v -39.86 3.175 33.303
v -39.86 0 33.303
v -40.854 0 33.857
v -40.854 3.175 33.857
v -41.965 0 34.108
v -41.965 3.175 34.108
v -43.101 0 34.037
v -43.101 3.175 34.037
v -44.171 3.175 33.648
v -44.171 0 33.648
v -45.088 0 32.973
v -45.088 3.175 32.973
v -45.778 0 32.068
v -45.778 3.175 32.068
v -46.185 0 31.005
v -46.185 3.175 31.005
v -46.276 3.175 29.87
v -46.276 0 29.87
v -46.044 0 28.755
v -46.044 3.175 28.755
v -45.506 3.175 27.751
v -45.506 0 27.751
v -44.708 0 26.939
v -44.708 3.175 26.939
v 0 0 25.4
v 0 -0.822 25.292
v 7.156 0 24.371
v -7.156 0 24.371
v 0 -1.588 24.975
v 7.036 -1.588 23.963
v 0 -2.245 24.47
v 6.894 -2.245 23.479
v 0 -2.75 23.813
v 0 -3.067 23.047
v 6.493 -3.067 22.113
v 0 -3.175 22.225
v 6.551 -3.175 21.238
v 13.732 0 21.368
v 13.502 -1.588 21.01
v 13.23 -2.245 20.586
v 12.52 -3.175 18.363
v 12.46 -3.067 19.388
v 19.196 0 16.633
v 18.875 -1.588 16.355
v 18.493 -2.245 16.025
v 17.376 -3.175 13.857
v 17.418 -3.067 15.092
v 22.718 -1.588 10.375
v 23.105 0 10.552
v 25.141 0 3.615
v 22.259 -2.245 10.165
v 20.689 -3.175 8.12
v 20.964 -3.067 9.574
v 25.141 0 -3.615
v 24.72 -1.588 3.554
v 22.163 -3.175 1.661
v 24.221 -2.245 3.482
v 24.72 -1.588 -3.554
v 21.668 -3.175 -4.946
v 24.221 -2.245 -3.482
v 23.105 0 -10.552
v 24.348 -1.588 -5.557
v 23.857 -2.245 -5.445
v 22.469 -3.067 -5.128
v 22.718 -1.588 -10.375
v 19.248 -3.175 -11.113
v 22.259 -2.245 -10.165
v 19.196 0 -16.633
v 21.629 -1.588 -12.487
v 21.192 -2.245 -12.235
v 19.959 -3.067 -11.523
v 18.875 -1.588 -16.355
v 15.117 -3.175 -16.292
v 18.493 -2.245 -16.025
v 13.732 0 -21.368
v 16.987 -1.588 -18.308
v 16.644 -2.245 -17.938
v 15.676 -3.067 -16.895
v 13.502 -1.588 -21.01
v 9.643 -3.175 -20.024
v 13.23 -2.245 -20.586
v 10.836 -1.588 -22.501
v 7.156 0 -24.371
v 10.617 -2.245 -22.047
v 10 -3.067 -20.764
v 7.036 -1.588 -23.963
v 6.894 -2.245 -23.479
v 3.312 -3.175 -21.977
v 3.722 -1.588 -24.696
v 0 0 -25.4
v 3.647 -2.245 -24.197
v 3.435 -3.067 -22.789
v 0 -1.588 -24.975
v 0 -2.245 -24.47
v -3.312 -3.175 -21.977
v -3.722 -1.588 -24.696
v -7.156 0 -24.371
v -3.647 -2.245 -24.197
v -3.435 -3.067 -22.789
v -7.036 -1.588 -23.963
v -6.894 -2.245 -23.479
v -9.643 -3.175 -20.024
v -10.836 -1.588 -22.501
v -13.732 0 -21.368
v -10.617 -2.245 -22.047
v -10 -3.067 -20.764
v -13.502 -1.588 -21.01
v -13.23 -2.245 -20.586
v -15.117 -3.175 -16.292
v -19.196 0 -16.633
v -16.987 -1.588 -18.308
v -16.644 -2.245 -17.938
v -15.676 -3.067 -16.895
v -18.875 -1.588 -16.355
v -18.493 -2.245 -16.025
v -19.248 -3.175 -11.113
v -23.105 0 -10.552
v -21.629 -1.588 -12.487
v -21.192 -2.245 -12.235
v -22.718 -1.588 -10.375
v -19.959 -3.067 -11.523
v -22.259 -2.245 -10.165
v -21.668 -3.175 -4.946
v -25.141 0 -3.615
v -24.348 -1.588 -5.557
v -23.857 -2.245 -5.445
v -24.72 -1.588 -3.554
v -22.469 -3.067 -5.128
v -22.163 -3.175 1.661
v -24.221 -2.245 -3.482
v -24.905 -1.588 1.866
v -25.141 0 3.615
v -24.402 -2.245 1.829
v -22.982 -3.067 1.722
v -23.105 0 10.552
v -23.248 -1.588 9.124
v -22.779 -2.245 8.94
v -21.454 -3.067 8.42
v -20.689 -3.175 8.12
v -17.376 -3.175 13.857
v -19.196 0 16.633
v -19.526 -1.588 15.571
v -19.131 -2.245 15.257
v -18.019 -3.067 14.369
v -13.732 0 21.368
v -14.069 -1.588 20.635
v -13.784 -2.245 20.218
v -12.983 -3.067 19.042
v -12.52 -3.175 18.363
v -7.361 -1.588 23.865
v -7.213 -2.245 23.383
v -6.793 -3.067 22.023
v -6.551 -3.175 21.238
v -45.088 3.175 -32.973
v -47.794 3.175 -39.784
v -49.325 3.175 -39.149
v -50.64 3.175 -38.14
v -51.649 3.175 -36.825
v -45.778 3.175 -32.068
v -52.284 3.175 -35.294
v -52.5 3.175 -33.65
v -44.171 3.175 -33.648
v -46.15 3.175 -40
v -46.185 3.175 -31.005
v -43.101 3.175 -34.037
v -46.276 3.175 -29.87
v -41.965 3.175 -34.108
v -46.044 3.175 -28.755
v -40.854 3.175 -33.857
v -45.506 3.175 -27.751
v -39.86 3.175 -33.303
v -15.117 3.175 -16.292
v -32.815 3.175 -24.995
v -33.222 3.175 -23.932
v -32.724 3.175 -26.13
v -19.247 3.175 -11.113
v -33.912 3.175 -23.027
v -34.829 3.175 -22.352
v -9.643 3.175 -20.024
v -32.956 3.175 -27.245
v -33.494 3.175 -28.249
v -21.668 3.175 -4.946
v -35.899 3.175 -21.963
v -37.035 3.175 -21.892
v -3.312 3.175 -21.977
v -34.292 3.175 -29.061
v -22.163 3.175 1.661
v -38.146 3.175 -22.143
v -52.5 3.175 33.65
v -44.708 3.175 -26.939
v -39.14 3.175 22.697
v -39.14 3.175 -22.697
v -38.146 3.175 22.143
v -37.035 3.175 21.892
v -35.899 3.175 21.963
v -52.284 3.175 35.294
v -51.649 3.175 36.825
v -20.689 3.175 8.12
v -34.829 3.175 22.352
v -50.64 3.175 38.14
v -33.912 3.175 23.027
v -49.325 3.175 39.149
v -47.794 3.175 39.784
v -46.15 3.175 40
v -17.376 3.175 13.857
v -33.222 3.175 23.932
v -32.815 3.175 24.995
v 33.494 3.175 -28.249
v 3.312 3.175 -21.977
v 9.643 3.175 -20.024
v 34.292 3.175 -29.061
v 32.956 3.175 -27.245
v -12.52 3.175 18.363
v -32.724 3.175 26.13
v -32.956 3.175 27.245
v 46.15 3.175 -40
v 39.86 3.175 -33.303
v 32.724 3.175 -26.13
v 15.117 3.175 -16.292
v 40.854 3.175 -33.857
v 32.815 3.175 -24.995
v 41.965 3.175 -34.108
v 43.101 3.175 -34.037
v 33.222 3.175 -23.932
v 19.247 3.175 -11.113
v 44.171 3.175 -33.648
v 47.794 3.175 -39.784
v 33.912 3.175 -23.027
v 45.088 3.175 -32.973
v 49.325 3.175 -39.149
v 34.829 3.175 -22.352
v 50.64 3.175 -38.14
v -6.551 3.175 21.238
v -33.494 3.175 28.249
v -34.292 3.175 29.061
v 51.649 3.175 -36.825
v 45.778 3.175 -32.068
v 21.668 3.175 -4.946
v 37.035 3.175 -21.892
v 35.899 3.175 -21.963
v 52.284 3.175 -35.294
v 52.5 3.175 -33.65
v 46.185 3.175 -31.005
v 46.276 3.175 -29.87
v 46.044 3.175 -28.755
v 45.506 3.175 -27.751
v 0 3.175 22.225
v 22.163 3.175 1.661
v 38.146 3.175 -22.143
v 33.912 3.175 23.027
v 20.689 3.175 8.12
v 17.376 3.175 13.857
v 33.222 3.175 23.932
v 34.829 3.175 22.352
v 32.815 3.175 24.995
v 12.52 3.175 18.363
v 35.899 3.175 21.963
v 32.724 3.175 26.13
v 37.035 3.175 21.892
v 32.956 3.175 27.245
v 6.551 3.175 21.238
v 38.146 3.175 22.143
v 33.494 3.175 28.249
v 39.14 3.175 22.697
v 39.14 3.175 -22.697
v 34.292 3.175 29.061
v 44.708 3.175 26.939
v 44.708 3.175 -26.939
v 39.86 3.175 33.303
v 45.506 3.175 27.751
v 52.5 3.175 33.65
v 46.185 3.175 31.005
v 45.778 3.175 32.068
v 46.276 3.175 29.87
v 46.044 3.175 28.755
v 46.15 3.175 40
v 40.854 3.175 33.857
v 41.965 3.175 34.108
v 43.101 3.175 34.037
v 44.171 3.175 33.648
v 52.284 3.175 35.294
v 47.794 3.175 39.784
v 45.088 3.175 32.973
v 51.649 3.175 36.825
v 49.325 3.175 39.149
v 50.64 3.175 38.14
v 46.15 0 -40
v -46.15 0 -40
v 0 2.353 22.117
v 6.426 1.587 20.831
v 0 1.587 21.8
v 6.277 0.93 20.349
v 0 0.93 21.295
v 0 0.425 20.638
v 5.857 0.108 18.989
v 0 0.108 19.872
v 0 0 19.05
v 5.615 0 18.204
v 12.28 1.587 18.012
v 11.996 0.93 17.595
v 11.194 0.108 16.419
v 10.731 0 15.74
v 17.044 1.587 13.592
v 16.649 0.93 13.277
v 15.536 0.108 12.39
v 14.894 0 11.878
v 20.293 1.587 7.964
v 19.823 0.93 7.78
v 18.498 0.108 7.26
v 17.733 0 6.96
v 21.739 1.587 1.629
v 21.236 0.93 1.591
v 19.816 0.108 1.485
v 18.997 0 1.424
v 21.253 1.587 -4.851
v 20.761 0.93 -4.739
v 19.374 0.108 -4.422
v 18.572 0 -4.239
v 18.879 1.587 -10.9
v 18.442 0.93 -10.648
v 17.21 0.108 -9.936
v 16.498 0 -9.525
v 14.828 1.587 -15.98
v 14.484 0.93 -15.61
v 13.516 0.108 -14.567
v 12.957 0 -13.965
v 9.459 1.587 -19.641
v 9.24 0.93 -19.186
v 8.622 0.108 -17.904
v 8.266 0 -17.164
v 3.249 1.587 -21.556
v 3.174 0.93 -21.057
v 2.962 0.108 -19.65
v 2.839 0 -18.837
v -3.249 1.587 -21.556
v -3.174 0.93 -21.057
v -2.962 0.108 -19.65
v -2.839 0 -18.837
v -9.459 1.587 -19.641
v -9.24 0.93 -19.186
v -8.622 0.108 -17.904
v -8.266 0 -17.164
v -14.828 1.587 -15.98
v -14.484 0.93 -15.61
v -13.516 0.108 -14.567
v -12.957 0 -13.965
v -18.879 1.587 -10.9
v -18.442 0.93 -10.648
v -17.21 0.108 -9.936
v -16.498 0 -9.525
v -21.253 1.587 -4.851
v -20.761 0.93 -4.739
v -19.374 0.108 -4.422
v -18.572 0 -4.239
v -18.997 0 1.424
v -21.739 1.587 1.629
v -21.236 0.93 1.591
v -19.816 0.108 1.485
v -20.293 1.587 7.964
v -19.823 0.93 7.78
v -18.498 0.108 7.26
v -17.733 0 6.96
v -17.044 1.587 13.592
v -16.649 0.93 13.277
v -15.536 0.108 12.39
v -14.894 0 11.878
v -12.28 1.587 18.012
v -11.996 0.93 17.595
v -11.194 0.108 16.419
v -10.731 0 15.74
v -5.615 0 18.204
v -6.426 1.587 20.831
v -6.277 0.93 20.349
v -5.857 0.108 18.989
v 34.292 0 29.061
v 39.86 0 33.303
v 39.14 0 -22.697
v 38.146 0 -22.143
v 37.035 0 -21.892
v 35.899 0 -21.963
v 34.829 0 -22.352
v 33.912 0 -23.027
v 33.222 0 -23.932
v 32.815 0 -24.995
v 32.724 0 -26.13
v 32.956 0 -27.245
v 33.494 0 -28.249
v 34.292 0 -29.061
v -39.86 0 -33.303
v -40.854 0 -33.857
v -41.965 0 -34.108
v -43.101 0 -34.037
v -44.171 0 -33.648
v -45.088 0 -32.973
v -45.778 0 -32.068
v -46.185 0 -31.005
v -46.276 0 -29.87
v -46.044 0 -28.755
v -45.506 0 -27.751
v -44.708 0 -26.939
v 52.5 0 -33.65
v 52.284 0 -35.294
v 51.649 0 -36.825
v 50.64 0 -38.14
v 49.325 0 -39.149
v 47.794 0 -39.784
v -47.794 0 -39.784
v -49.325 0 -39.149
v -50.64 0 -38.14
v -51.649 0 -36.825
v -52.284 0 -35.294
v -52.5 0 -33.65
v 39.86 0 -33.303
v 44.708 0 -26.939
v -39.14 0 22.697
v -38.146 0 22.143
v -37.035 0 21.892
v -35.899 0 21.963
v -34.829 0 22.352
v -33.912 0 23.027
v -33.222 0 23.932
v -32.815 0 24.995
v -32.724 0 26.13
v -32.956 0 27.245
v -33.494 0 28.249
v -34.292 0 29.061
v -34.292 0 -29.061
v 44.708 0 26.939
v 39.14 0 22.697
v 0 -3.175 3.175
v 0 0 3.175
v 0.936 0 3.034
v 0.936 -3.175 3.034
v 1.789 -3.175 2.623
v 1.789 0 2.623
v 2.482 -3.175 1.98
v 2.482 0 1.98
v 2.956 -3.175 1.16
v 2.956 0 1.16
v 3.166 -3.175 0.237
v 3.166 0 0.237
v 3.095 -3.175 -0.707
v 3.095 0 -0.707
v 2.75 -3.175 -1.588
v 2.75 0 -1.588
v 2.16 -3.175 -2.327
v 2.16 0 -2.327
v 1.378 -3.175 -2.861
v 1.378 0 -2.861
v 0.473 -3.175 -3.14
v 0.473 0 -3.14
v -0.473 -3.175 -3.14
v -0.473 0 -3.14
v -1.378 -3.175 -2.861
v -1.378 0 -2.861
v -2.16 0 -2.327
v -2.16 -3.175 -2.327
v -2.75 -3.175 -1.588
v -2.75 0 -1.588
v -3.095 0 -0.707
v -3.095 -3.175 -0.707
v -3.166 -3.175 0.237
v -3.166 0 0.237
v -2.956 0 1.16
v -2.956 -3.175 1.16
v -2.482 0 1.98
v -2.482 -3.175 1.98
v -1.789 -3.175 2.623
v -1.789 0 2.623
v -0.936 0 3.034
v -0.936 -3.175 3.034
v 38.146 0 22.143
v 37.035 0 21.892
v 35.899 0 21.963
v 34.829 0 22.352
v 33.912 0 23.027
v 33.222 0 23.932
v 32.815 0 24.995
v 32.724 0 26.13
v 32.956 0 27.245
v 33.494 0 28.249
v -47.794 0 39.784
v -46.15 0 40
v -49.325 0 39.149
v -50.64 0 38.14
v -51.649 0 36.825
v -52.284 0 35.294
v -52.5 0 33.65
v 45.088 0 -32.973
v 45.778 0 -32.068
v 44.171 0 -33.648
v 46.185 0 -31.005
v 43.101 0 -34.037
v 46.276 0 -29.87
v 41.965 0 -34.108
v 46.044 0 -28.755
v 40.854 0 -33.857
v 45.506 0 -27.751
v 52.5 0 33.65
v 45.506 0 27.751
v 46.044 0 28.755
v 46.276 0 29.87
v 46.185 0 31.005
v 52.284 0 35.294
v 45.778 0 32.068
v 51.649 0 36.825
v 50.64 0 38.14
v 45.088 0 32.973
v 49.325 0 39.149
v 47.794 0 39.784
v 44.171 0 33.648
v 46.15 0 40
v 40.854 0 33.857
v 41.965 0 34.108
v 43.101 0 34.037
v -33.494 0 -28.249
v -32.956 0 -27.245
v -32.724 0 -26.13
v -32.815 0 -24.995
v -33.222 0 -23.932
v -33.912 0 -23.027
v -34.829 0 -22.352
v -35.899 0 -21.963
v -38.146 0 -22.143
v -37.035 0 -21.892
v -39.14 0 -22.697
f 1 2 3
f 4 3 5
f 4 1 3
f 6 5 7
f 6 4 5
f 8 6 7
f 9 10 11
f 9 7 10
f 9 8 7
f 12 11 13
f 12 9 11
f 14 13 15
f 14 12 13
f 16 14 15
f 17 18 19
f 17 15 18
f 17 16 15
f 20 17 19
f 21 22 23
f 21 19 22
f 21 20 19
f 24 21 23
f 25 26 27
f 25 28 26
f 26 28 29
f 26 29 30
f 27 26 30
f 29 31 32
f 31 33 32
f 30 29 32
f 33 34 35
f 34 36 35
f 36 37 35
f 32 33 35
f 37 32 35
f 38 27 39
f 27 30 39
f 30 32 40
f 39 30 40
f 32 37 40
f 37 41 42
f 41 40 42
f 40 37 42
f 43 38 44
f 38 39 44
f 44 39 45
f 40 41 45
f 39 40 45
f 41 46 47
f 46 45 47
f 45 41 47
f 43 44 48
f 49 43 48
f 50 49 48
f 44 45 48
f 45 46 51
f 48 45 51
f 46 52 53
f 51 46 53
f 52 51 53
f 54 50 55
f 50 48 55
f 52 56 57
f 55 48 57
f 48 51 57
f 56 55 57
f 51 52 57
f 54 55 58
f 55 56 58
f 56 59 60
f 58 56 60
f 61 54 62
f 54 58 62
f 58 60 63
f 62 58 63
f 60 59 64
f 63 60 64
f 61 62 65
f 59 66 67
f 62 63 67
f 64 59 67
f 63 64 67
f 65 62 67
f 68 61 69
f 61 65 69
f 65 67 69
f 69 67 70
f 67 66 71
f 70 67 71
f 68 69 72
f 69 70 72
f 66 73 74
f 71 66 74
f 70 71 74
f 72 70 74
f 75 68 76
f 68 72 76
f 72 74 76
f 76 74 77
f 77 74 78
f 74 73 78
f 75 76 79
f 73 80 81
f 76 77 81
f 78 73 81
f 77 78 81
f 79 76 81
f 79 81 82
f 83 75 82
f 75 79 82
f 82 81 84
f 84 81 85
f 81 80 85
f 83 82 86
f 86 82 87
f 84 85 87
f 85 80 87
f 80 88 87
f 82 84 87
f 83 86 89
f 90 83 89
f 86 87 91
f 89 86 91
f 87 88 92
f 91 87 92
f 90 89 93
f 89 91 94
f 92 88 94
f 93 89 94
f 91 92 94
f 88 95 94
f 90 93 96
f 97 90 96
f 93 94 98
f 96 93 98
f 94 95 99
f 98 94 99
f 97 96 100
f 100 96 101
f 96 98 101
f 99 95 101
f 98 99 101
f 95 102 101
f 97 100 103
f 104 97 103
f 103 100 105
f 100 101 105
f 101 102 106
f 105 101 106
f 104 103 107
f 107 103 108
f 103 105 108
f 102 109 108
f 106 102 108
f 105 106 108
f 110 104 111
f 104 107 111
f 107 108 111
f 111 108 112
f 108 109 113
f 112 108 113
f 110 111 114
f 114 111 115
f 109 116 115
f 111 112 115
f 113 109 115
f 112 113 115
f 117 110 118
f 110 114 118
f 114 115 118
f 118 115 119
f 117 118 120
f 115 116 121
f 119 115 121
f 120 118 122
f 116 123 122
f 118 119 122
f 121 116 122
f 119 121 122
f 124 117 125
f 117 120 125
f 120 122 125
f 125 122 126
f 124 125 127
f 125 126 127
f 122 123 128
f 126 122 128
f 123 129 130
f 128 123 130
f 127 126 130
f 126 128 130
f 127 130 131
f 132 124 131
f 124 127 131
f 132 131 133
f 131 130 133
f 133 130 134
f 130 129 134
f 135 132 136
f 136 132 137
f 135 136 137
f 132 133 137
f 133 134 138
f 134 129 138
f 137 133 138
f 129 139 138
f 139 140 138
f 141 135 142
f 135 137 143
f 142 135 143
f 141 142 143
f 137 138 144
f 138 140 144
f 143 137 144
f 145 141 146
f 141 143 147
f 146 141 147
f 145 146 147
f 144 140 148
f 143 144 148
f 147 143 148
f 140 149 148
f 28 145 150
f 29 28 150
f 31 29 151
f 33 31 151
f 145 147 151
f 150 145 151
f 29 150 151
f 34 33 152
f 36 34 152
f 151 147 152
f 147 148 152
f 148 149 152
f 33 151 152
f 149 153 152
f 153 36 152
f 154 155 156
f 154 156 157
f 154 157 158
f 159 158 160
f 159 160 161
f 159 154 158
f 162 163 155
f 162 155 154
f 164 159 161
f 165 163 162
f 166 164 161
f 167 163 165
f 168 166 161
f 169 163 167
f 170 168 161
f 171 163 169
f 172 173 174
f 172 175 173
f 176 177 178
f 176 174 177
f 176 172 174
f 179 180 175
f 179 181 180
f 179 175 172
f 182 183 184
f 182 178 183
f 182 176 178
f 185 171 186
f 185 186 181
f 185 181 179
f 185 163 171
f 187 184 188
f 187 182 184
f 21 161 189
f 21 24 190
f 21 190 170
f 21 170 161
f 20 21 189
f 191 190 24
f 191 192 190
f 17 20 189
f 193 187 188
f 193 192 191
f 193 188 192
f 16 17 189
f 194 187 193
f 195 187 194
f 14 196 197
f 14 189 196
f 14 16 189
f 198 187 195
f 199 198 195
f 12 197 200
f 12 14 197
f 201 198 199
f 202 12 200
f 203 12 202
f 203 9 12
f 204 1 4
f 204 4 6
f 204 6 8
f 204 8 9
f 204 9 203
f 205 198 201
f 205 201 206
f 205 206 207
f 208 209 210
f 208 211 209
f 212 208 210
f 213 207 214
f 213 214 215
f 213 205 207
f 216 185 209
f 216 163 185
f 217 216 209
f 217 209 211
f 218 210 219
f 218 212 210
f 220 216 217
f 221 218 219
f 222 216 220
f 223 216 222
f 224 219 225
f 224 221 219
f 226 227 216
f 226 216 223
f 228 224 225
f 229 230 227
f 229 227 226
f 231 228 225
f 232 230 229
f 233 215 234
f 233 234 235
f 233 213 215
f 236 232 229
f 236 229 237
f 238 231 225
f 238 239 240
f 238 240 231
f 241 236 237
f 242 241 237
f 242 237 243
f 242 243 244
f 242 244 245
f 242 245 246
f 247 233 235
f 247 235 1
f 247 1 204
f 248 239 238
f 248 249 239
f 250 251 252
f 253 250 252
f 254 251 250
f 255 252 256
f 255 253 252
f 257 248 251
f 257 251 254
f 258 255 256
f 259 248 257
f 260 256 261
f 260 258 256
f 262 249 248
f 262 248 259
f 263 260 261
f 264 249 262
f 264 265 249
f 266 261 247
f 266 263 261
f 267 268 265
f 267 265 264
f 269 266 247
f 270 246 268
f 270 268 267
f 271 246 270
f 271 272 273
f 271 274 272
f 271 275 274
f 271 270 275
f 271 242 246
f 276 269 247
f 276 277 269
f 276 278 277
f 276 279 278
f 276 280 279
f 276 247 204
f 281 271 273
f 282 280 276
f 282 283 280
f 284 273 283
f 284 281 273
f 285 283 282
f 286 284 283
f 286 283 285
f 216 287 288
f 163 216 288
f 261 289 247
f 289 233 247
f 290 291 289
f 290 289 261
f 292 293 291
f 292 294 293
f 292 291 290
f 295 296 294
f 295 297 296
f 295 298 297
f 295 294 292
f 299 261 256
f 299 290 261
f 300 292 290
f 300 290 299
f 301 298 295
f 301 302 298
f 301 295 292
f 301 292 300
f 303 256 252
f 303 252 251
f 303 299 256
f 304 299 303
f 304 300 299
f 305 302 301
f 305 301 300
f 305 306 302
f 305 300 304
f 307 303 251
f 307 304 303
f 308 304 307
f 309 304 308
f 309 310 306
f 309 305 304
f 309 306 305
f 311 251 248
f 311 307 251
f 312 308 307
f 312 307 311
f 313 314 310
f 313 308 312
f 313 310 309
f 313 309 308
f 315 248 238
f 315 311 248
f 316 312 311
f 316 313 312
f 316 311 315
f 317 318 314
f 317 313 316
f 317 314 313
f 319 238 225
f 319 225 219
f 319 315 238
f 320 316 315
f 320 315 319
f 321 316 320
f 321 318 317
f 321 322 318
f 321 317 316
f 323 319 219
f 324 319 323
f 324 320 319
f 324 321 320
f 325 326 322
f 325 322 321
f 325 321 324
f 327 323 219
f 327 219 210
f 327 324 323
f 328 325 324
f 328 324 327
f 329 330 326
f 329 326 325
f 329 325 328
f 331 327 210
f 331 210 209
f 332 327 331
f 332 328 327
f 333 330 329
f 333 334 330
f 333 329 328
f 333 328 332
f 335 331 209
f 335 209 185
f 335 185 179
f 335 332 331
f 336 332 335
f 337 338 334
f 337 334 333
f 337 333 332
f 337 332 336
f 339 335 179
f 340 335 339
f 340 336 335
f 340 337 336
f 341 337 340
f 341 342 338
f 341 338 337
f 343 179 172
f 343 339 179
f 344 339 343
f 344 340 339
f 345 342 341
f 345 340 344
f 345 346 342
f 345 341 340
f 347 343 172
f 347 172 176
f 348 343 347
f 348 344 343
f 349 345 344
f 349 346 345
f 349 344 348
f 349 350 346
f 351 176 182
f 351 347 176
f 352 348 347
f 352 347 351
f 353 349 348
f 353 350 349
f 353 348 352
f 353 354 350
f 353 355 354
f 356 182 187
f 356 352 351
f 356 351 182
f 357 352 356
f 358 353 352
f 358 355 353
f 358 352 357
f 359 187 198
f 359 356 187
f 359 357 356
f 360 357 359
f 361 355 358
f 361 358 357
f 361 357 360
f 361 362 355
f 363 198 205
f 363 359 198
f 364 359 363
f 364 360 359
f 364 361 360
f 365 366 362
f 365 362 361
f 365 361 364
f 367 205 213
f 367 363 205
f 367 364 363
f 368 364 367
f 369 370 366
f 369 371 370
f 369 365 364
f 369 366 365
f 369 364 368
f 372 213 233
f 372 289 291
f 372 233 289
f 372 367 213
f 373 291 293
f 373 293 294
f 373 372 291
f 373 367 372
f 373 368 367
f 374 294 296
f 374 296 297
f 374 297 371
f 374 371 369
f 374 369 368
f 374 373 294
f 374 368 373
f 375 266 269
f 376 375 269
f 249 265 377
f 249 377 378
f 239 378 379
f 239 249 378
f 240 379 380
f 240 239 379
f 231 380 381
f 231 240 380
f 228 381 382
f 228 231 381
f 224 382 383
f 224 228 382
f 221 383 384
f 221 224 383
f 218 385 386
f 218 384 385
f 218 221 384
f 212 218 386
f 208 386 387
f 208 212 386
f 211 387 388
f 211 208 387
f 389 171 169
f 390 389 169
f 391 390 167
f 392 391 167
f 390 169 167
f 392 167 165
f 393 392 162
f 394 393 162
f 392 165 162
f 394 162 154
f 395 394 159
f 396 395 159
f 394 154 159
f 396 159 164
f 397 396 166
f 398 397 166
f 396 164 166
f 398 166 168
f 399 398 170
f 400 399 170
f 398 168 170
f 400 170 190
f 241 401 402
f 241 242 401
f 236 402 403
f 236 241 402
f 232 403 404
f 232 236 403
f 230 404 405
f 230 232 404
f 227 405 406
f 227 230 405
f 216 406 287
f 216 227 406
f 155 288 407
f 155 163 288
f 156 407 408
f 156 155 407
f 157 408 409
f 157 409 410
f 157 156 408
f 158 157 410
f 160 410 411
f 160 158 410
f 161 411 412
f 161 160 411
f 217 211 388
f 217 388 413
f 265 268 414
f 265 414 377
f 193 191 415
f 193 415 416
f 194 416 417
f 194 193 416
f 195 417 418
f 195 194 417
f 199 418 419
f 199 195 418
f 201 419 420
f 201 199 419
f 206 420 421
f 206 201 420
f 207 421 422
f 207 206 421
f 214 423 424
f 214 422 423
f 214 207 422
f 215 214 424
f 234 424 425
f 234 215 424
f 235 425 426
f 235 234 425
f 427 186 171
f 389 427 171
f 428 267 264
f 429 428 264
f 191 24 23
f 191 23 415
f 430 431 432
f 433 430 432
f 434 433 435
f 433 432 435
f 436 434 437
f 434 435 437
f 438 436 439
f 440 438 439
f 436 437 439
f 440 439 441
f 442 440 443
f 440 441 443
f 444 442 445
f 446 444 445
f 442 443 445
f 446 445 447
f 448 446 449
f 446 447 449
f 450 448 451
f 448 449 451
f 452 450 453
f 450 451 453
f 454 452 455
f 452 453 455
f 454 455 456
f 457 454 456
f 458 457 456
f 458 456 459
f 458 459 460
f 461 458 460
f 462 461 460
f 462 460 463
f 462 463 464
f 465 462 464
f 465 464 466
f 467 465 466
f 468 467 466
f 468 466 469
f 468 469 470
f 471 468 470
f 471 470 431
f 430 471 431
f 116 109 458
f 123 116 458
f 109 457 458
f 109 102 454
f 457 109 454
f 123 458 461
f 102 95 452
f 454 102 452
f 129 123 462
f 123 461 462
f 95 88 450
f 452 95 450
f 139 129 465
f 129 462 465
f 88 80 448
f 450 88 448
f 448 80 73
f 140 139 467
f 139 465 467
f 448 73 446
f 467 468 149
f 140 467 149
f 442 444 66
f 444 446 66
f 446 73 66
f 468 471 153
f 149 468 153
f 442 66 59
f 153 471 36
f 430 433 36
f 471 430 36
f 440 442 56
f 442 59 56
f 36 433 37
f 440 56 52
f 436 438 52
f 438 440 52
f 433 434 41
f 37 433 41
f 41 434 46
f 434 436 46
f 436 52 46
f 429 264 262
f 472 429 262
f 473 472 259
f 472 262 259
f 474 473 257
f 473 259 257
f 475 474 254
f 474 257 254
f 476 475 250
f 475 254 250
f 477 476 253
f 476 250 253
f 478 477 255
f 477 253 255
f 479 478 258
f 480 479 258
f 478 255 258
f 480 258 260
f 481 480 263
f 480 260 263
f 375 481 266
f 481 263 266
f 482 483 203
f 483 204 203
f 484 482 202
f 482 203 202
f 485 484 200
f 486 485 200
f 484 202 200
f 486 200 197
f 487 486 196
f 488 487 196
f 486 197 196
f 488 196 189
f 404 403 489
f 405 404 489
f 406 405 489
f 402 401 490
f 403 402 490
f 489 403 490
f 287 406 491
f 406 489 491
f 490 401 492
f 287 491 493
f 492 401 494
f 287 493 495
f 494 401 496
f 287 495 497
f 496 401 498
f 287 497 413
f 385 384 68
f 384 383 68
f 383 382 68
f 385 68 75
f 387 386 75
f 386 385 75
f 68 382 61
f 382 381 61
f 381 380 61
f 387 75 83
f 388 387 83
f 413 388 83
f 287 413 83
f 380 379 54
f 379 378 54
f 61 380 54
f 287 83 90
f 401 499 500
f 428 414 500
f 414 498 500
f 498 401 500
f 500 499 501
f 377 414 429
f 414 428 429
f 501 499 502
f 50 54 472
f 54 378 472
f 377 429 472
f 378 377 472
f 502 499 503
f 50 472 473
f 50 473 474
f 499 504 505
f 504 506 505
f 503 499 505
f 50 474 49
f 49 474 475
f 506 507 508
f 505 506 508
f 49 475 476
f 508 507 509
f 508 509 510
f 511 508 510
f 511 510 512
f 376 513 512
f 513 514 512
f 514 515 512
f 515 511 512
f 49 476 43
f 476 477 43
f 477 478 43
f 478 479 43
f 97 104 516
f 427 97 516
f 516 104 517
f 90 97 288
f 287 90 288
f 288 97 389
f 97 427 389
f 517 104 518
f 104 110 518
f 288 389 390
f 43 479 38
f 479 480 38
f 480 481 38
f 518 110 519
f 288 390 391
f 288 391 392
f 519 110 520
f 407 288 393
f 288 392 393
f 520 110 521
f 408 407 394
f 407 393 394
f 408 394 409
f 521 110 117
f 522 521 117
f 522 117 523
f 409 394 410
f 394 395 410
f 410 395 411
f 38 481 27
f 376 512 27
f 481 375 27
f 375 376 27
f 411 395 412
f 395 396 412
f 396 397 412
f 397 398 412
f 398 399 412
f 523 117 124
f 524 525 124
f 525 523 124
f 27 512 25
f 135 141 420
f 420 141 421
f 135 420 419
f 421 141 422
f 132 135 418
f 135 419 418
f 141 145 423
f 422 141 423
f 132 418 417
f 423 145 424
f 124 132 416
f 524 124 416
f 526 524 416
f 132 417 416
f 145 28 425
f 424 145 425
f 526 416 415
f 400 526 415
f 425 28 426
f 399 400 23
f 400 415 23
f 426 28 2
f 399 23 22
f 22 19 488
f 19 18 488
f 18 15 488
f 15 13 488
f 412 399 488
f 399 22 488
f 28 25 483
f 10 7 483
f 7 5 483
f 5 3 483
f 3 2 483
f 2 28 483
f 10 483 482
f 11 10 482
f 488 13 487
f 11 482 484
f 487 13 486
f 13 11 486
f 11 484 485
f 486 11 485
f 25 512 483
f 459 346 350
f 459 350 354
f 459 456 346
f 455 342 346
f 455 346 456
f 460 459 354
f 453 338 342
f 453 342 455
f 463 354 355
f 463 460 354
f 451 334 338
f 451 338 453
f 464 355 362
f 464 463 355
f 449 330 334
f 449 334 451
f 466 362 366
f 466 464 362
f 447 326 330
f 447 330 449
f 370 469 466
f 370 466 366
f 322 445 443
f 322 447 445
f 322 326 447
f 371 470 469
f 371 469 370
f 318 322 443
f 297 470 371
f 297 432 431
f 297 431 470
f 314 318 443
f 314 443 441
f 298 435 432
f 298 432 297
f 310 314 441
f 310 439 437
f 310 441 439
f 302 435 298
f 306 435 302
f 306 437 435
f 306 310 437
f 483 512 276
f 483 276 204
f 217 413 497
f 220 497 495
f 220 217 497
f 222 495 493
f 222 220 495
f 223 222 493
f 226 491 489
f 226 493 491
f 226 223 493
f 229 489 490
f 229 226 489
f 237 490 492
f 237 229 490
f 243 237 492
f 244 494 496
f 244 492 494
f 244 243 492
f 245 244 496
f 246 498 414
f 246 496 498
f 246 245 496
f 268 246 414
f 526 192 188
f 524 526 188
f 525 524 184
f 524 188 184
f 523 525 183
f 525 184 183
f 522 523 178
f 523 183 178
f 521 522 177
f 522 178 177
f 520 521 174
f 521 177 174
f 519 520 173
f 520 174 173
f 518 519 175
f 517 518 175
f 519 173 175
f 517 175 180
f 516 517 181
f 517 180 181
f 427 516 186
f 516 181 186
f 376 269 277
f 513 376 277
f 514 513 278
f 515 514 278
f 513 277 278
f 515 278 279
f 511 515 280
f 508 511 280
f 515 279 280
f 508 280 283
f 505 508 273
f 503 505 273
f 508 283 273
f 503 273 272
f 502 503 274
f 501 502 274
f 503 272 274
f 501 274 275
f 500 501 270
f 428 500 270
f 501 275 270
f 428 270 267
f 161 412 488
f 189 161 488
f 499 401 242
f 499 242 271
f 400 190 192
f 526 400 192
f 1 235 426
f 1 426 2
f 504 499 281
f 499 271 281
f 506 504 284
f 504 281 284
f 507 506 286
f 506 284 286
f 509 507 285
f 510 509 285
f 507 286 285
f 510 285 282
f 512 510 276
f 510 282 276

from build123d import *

# Parameters (mm, degrees)
SKETCH12_W          = 105
SKETCH12_H          = 80
BOSS_EXTRUDE6_DEPTH = 3.175
SKETCH15_R          = 25.4
BOSS_EXTRUDE7_DEPTH = 6.35
SKETCH16_R          = 22.225
CUT_EXTRUDE3_DEPTH  = 3.175
CUT_EXTRUDE2_REACH  = 68.307
SKETCH14_R          = 3.175
FILLET6_R           = 6.35
FILLET7_R           = 3.175


with BuildPart() as part:
    # Sketch12 → Boss-Extrude6 (new body)
    with BuildSketch(Plane(origin=(0, 0, 0), x_dir=(-1, 0, 0), z_dir=(0, 1, 0))):
        Rectangle(SKETCH12_W, SKETCH12_H)
    extrude(amount=BOSS_EXTRUDE6_DEPTH)

    # Sketch15 → Boss-Extrude7 (add)
    with BuildSketch(Plane(origin=(0, 3.175, 0), x_dir=(1, 0, 0), z_dir=(0, 1, 0))):
        with Locations(Location((0, 0, 0), (0, 0, 270))):
            Circle(SKETCH15_R)
    extrude(amount=-BOSS_EXTRUDE7_DEPTH)

    # Sketch16 → Cut-Extrude3 (cut)
    with BuildSketch(Plane(origin=(0, 3.175, 0), x_dir=(1, 0, 0), z_dir=(0, 1, 0))):
        with Locations(Location((0, 0, 0), (0, 0, 270))):
            Circle(SKETCH16_R)
    extrude(amount=-CUT_EXTRUDE3_DEPTH, mode=Mode.SUBTRACT)

    # Sketch14 → Cut-Extrude2 (cut, up to next)
    with BuildSketch(Plane(origin=(0, 3.175, 0), x_dir=(-1, 0, 0), z_dir=(0, 1, 0)), mode=Mode.PRIVATE) as cut_extrude2_sk1:
        with Locations(Location((0, 0, 0), (0, 0, 90))):
            Circle(SKETCH14_R)
    cut_extrude2_tool1 = extrude(cut_extrude2_sk1.sketch, amount=-CUT_EXTRUDE2_REACH, mode=Mode.PRIVATE) & part.part
    # Sketch14 → Cut-Extrude2 (cut, up to next)
    with BuildSketch(Plane(origin=(0, 3.175, 0), x_dir=(-1, 0, 0), z_dir=(0, 1, 0)), mode=Mode.PRIVATE) as cut_extrude2_sk2:
        with BuildLine():
            Line((44.708183881, 26.939424373), (39.140161841, 22.697121866))
            ThreePointArc((39.140161841, 22.697121866), (33.5342621, 23.454675886), (34.291816119, 29.060575627))
            Line((34.291816119, 29.060575627), (39.859838159, 33.302878134))
            ThreePointArc((39.859838159, 33.302878134), (45.4657379, 32.545324114), (44.708183881, 26.939424373))
        make_face()
    cut_extrude2_tool2 = extrude(cut_extrude2_sk2.sketch, amount=-CUT_EXTRUDE2_REACH, mode=Mode.PRIVATE) & part.part
    # Sketch14 → Cut-Extrude2 (cut, up to next)
    with BuildSketch(Plane(origin=(0, 3.175, 0), x_dir=(-1, 0, 0), z_dir=(0, 1, 0)), mode=Mode.PRIVATE) as cut_extrude2_sk3:
        with BuildLine():
            Line((-44.708183881, 26.939424373), (-39.140161841, 22.697121866))
            ThreePointArc((-39.140161841, 22.697121866), (-33.5342621, 23.454675886), (-34.291816119, 29.060575627))
            Line((-34.291816119, 29.060575627), (-39.859838159, 33.302878134))
            ThreePointArc((-39.859838159, 33.302878134), (-45.4657379, 32.545324114), (-44.708183881, 26.939424373))
        make_face()
    cut_extrude2_tool3 = extrude(cut_extrude2_sk3.sketch, amount=-CUT_EXTRUDE2_REACH, mode=Mode.PRIVATE) & part.part
    # Sketch14 → Cut-Extrude2 (cut, up to next)
    with BuildSketch(Plane(origin=(0, 3.175, 0), x_dir=(-1, 0, 0), z_dir=(0, 1, 0)), mode=Mode.PRIVATE) as cut_extrude2_sk4:
        with BuildLine():
            Line((-44.708183881, -26.939424373), (-39.140161841, -22.697121866))
            ThreePointArc((-39.140161841, -22.697121866), (-33.5342621, -23.454675886), (-34.291816119, -29.060575627))
            Line((-34.291816119, -29.060575627), (-39.859838159, -33.302878134))
            ThreePointArc((-39.859838159, -33.302878134), (-45.4657379, -32.545324114), (-44.708183881, -26.939424373))
        make_face()
    cut_extrude2_tool4 = extrude(cut_extrude2_sk4.sketch, amount=-CUT_EXTRUDE2_REACH, mode=Mode.PRIVATE) & part.part
    # Sketch14 → Cut-Extrude2 (cut, up to next)
    with BuildSketch(Plane(origin=(0, 3.175, 0), x_dir=(-1, 0, 0), z_dir=(0, 1, 0)), mode=Mode.PRIVATE) as cut_extrude2_sk5:
        with BuildLine():
            Line((44.708183881, -26.939424373), (39.140161841, -22.697121866))
            ThreePointArc((39.140161841, -22.697121866), (33.5342621, -23.454675886), (34.291816119, -29.060575627))
            Line((34.291816119, -29.060575627), (39.859838159, -33.302878134))
            ThreePointArc((39.859838159, -33.302878134), (45.4657379, -32.545324114), (44.708183881, -26.939424373))
        make_face()
    cut_extrude2_tool5 = extrude(cut_extrude2_sk5.sketch, amount=-CUT_EXTRUDE2_REACH, mode=Mode.PRIVATE) & part.part
    add(cut_extrude2_tool1.solids().sort_by_distance((0, 3.175, 0))[0], mode=Mode.SUBTRACT)
    add(cut_extrude2_tool2.solids().sort_by_distance((-39.5, 3.175, 28))[0], mode=Mode.SUBTRACT)
    add(cut_extrude2_tool3.solids().sort_by_distance((39.5, 3.175, 28))[0], mode=Mode.SUBTRACT)
    add(cut_extrude2_tool4.solids().sort_by_distance((39.5, 3.175, -28))[0], mode=Mode.SUBTRACT)
    add(cut_extrude2_tool5.solids().sort_by_distance((-39.5, 3.175, -28))[0], mode=Mode.SUBTRACT)

    # Fillet6
    fillet6_edges = [part.edges().sort_by_distance(p)[0] for p in [
        (52.5, 1.5875, 40),
        (-52.5, 1.5875, 40),
        (-52.5, 1.5875, -40),
        (52.5, 1.5875, -40),
    ]]
    fillet(fillet6_edges, radius=FILLET6_R)

    # Fillet7
    fillet7_edges = [part.edges().sort_by_distance(p)[0] for p in [
        (0, -3.175, -25.4),
        (0, 0, -22.225),
    ]]
    fillet(fillet7_edges, radius=FILLET7_R - 0.0001)  # a hair under: the kernel refuses the full size


solid = part.part
